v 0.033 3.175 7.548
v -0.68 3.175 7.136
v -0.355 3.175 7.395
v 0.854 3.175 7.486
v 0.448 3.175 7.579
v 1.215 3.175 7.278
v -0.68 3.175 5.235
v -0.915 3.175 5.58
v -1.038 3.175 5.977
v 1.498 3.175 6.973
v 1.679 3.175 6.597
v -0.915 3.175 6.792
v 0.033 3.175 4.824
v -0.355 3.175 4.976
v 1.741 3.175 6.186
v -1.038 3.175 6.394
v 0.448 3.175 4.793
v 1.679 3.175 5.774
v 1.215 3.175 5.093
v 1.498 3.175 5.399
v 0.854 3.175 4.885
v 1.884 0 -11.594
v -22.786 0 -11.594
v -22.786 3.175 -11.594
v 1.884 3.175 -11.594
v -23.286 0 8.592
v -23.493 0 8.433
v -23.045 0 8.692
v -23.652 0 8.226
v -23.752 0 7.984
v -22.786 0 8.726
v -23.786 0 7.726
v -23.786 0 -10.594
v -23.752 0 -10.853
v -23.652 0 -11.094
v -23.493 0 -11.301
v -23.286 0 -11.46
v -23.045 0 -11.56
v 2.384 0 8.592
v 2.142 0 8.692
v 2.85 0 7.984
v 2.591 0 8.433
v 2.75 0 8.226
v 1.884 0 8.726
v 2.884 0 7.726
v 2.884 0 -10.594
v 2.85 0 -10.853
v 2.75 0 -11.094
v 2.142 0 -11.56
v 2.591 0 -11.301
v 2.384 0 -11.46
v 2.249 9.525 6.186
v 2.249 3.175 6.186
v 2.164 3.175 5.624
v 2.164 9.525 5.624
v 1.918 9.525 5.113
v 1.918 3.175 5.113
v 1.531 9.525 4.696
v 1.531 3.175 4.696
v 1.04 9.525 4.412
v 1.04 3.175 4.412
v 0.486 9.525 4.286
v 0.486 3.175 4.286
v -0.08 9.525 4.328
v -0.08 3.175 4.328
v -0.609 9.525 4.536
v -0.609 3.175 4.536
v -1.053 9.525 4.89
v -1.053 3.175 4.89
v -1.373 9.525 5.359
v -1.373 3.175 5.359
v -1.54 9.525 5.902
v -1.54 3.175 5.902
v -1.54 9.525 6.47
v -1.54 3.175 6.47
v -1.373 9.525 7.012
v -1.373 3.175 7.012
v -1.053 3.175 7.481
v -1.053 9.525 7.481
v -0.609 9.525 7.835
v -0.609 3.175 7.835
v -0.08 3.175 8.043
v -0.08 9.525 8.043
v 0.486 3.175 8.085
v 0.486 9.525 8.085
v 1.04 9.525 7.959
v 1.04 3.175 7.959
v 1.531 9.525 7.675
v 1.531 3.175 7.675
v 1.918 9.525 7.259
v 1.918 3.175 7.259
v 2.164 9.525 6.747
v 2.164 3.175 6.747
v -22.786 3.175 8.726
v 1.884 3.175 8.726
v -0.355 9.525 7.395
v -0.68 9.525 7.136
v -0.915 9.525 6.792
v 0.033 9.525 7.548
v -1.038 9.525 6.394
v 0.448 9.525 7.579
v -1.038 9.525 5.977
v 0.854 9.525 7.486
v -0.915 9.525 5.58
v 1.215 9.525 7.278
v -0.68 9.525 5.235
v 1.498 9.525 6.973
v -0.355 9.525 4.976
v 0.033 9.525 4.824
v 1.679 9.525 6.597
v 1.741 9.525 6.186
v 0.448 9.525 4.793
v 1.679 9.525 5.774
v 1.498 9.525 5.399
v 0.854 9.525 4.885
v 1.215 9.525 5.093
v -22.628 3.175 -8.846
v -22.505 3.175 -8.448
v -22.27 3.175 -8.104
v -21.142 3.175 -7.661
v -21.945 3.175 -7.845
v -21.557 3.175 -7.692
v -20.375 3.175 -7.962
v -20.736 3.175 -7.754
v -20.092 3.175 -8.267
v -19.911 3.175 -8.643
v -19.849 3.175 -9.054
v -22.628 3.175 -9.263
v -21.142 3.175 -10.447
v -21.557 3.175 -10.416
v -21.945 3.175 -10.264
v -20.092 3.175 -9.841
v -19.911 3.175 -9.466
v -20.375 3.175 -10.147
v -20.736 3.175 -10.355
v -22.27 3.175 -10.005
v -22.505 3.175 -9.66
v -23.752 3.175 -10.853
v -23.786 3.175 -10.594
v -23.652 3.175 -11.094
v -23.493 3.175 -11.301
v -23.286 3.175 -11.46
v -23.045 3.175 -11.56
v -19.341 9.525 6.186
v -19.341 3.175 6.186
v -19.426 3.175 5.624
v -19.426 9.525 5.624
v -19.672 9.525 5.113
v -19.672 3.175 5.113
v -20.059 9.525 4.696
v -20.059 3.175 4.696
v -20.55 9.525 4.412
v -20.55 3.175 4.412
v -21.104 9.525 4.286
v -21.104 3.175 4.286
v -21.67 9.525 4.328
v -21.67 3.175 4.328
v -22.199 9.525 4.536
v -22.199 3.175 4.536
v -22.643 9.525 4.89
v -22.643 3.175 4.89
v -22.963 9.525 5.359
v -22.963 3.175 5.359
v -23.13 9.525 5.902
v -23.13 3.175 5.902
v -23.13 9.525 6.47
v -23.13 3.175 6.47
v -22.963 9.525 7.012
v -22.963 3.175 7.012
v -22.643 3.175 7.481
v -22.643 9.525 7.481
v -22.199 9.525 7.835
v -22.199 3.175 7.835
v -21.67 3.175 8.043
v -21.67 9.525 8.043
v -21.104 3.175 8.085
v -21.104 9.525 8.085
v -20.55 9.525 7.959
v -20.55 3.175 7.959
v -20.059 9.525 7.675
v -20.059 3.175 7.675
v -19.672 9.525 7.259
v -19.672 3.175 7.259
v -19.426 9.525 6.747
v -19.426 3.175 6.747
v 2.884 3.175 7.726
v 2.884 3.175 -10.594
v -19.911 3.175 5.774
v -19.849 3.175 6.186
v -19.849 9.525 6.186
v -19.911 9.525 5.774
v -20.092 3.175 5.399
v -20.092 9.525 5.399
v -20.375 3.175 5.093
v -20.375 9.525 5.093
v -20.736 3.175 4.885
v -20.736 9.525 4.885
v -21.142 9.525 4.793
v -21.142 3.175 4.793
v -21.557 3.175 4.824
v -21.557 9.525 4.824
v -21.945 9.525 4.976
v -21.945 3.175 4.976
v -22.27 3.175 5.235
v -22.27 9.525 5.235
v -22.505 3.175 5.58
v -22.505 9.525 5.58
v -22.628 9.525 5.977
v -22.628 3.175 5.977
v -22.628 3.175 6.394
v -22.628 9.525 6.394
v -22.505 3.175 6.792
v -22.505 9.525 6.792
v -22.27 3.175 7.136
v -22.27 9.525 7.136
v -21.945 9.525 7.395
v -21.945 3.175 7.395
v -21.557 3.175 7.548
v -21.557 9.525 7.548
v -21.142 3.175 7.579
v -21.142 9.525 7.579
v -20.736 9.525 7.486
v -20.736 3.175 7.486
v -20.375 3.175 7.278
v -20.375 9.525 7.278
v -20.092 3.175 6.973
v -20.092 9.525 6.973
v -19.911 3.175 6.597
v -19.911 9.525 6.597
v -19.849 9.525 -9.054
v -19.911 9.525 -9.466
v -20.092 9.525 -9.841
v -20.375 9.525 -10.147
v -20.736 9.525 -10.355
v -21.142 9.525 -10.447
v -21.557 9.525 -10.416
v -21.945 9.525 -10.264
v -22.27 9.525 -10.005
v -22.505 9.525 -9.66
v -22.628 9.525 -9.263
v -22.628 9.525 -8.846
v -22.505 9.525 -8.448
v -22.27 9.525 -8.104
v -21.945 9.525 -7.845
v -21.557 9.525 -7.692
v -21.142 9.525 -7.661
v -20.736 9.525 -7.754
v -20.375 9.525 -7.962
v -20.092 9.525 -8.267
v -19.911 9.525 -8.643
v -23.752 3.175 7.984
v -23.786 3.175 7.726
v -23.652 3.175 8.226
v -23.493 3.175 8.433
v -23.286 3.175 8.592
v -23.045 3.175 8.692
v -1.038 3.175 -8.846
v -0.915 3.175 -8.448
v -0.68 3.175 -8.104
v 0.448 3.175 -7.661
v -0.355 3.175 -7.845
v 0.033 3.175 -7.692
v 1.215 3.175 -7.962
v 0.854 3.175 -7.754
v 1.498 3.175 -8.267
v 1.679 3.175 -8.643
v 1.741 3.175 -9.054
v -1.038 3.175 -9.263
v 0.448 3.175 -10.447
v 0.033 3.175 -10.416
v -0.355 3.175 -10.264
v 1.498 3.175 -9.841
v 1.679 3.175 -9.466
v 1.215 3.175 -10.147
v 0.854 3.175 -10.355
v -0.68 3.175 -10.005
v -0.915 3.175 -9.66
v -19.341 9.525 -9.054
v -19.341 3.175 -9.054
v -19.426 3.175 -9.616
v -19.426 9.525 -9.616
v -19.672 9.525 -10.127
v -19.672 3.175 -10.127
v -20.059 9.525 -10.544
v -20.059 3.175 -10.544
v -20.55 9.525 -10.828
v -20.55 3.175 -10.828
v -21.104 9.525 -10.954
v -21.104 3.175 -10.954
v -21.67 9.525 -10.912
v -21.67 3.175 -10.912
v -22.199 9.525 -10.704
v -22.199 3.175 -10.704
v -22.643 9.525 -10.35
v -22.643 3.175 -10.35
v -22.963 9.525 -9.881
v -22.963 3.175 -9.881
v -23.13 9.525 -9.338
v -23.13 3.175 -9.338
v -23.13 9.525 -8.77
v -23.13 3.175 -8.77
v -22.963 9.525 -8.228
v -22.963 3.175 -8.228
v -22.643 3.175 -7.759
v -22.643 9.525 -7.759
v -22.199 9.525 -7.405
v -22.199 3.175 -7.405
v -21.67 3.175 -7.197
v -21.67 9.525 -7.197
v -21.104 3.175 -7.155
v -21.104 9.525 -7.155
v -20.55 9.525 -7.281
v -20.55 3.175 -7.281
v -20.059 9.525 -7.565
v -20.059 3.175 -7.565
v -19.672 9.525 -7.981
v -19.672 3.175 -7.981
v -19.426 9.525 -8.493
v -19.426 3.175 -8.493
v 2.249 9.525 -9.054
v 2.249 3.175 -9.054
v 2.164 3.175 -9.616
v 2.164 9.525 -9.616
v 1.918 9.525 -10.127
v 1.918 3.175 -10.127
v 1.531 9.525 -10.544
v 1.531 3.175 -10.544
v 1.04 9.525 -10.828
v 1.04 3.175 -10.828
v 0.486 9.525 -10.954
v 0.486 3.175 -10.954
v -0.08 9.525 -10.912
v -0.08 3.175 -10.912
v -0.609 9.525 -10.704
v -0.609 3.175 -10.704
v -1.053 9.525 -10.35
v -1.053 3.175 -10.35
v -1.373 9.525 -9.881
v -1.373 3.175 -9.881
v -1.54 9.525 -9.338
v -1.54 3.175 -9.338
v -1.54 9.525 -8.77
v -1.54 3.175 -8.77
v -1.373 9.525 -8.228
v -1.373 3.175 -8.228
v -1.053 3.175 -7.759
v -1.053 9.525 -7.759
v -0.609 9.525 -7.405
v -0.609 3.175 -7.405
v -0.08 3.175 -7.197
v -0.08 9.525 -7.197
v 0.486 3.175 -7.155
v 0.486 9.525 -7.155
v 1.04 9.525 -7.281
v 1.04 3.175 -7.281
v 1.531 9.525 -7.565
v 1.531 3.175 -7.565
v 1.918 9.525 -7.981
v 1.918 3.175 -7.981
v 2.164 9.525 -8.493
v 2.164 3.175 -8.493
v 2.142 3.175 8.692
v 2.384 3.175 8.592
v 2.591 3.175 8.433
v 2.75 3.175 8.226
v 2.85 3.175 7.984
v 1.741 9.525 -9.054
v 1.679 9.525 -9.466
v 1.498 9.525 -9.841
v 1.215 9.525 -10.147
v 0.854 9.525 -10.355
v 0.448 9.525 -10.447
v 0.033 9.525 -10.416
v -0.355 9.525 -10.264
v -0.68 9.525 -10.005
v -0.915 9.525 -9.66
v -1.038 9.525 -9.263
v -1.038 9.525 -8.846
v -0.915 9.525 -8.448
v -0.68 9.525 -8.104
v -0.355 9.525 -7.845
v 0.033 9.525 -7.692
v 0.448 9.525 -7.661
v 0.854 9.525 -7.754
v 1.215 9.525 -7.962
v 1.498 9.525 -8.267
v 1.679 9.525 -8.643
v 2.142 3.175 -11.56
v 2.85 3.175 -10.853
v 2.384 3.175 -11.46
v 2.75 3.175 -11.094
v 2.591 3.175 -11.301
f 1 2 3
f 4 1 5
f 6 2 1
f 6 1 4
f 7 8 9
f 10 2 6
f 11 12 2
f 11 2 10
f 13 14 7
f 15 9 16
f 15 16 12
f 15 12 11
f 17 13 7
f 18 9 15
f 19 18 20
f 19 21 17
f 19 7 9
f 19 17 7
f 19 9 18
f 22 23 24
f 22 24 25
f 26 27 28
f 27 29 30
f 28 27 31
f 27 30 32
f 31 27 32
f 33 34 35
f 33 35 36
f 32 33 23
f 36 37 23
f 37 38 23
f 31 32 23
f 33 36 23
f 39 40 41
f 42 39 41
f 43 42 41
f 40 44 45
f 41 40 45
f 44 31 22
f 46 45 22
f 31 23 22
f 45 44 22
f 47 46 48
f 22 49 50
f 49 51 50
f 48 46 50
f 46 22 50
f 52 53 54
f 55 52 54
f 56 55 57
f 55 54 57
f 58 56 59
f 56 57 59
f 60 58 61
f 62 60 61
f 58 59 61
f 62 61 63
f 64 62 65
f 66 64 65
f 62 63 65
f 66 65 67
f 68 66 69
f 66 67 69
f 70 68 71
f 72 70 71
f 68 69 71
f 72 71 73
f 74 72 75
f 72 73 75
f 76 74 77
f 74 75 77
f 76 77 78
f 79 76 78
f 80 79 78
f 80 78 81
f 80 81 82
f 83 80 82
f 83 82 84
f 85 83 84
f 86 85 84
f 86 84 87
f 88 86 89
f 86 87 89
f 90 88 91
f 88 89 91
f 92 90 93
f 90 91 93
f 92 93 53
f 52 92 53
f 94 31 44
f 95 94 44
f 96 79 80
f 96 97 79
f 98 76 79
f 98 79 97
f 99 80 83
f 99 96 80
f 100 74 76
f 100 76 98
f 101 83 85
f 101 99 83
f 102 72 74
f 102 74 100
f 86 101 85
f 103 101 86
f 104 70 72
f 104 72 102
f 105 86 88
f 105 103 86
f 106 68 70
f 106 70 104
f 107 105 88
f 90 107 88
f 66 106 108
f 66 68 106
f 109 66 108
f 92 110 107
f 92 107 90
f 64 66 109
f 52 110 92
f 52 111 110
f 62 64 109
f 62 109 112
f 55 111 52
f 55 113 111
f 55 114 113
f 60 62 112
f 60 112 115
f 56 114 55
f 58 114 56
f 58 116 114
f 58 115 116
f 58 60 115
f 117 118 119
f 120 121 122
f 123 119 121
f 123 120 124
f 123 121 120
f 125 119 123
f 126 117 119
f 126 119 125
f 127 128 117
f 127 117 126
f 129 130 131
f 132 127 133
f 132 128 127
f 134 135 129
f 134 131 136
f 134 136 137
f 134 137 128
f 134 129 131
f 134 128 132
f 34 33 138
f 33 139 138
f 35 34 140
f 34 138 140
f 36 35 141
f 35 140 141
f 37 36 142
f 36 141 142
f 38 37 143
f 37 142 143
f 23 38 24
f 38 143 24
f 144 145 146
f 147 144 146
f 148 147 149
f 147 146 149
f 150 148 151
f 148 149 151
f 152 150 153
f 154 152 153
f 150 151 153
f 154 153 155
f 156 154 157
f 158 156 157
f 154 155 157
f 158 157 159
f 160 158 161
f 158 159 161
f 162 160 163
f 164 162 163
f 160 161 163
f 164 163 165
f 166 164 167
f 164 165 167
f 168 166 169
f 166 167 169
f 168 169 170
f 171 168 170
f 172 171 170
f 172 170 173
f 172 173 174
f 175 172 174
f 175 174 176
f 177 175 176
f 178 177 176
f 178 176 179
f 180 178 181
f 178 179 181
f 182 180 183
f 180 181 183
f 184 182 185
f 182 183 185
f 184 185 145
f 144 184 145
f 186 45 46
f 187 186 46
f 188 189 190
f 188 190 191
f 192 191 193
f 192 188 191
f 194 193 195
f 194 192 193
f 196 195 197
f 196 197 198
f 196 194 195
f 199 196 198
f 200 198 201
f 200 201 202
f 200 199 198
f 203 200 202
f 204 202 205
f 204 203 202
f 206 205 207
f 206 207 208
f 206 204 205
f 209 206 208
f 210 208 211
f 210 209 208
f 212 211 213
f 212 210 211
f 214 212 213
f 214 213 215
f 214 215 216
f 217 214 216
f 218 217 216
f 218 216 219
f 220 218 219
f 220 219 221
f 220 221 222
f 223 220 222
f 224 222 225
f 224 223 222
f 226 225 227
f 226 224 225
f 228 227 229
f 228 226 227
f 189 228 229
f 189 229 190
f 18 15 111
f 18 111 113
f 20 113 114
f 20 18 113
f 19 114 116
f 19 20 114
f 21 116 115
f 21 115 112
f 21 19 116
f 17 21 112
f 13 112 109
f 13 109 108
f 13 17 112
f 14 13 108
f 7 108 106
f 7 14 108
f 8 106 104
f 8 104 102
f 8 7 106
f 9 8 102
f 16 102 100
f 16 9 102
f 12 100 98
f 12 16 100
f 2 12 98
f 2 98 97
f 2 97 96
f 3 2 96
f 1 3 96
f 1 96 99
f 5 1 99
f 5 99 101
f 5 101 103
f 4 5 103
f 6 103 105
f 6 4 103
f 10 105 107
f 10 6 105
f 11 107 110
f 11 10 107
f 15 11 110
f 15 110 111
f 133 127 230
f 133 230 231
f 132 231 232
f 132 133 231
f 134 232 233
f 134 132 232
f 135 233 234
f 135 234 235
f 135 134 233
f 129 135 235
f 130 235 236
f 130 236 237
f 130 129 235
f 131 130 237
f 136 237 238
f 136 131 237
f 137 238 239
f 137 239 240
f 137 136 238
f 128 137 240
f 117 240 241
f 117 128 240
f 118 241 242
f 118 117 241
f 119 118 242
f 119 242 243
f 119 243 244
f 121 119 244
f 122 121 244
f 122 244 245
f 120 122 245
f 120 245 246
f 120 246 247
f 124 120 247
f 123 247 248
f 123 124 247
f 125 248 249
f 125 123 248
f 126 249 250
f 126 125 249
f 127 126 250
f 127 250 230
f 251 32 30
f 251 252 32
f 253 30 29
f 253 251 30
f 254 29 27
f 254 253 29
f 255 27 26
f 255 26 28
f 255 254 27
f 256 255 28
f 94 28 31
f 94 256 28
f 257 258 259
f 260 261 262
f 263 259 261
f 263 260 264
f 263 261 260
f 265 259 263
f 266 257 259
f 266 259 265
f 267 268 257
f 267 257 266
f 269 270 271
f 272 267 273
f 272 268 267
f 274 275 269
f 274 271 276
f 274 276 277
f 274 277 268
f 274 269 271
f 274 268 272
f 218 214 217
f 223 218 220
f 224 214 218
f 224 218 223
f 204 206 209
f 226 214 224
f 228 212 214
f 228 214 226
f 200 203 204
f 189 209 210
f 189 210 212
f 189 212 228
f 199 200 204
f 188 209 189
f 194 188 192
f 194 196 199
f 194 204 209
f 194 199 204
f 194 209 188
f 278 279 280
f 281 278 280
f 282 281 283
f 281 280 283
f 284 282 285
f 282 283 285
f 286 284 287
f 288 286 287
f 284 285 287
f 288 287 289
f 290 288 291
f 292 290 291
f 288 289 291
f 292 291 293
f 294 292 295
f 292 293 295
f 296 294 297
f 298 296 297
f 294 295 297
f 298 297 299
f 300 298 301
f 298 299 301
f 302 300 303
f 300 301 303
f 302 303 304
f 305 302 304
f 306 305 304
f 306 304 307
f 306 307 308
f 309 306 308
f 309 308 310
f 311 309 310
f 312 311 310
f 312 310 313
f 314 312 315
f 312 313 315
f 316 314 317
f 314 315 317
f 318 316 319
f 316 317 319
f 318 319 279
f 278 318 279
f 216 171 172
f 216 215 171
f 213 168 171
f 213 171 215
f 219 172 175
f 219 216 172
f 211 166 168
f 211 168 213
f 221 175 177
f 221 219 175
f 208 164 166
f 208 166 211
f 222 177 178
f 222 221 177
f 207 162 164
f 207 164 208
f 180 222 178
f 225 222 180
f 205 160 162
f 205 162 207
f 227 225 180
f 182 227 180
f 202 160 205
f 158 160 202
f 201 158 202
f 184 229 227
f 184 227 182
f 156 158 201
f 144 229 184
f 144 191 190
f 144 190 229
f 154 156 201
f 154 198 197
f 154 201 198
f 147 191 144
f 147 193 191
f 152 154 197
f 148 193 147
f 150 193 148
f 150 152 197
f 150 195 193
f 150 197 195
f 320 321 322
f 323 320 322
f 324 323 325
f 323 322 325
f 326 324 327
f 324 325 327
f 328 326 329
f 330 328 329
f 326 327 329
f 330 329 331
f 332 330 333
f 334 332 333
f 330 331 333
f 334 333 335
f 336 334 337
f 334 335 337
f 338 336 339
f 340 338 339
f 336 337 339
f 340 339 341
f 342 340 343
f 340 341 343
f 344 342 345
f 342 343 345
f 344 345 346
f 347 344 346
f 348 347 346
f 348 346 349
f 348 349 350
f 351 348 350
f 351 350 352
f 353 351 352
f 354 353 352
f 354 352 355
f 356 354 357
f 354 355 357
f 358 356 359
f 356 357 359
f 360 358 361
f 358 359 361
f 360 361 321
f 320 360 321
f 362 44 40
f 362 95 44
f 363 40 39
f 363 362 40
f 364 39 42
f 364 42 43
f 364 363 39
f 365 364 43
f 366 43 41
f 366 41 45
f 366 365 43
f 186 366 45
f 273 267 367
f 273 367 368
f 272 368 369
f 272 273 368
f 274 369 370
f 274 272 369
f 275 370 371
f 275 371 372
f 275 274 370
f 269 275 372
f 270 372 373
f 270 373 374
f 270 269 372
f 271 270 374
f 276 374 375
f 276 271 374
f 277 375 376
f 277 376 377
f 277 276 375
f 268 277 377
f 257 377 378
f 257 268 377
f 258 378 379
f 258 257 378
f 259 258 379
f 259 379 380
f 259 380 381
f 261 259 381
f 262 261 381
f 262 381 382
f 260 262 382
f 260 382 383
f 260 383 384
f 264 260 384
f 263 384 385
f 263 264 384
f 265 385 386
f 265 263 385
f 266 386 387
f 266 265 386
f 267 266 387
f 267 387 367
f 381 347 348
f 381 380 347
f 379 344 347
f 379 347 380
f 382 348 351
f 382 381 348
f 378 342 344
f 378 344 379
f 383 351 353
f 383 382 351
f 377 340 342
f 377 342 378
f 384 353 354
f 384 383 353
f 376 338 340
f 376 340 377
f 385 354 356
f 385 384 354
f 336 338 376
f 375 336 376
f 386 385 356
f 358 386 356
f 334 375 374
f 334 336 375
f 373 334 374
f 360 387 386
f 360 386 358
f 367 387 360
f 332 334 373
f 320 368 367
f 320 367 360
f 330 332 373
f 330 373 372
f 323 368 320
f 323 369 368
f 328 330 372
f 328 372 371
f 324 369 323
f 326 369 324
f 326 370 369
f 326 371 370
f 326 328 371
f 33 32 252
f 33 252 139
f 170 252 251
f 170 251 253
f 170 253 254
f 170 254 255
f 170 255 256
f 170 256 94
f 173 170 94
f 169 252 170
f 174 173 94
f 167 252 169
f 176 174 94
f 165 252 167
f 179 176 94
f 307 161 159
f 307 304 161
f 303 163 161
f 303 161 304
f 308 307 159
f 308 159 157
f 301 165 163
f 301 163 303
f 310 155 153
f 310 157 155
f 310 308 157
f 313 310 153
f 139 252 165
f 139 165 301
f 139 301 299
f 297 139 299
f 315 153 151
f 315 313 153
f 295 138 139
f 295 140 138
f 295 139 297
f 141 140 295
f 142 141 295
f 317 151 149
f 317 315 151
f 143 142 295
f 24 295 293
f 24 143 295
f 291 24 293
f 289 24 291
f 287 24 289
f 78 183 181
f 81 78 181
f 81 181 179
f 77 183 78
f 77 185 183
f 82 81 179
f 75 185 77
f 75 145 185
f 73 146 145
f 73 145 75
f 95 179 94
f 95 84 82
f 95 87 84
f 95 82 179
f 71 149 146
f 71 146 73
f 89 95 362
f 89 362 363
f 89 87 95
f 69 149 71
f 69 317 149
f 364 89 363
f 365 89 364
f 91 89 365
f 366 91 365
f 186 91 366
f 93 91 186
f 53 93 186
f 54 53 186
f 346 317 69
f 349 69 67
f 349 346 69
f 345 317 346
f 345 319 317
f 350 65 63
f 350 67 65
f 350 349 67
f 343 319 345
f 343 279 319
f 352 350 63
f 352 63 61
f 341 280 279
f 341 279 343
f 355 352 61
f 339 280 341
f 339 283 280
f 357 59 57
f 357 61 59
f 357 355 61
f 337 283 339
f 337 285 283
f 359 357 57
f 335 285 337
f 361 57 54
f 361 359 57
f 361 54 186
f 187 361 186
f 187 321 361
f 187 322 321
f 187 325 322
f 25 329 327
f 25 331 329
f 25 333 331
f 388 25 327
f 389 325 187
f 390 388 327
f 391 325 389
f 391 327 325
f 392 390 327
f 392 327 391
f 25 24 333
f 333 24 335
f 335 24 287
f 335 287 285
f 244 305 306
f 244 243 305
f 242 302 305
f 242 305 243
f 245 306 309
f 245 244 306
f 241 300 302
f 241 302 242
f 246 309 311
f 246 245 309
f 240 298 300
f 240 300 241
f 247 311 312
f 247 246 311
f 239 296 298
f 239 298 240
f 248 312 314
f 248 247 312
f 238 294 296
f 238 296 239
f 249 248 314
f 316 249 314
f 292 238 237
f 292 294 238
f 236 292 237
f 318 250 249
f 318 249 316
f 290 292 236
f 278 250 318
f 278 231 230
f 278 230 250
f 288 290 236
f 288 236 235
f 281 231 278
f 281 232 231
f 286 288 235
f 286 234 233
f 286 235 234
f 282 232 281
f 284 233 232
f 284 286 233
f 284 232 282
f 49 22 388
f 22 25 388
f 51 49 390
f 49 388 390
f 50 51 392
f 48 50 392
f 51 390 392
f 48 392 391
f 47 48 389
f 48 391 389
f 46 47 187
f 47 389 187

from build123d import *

# Parameters (mm, degrees)
SKETCH1_W           = 26.67
SKETCH1_H           = 20.32
BOSS_EXTRUDE1_DEPTH = 3.175
SKETCH2_R           = 1.905
SKETCH2_R_2         = 1.397
BOSS_EXTRUDE2_DEPTH = 6.35
FILLET1_R           = 1


with BuildPart() as part:
    # Sketch1 → Boss-Extrude1 (new body)
    with BuildSketch(Plane(origin=(0, 0, 0), x_dir=(1, 0, 0), z_dir=(0, 1, 0))):
        with Locations((-10.451352941, 1.434352941)):
            Rectangle(SKETCH1_W, SKETCH1_H)
    extrude(amount=BOSS_EXTRUDE1_DEPTH)

    # Sketch2 → Boss-Extrude2 (add)
    with BuildSketch(Plane(origin=(0, 3.175, 0), x_dir=(1, 0, 0), z_dir=(0, 1, 0))):
        with Locations((-21.246352941, 9.054352941)):
            Circle(SKETCH2_R)
        with Locations((-21.246352941, 9.054352941)):
            Circle(SKETCH2_R_2, mode=Mode.SUBTRACT)
        with Locations((0.343647059, 9.054352941)):
            Circle(SKETCH2_R)
        with Locations((0.343647059, 9.054352941)):
            Circle(SKETCH2_R_2, mode=Mode.SUBTRACT)
        with Locations((0.343647059, -6.185647059)):
            Circle(SKETCH2_R)
        with Locations((0.343647059, -6.185647059)):
            Circle(SKETCH2_R_2, mode=Mode.SUBTRACT)
        with Locations((-21.246352941, -6.185647059)):
            Circle(SKETCH2_R)
        with Locations((-21.246352941, -6.185647059)):
            Circle(SKETCH2_R_2, mode=Mode.SUBTRACT)
    extrude(amount=BOSS_EXTRUDE2_DEPTH)

    # Fillet1
    fillet1_edges = [part.edges().sort_by_distance(p)[0] for p in [
        (-23.786352941, 1.5875, -11.594352941),
        (2.883647059, 1.5875, -11.594352941),
        (2.883647059, 1.5875, 8.725647059),
        (-23.786352941, 1.5875, 8.725647059),
    ]]
    fillet(fillet1_edges, radius=FILLET1_R)


solid = part.part
